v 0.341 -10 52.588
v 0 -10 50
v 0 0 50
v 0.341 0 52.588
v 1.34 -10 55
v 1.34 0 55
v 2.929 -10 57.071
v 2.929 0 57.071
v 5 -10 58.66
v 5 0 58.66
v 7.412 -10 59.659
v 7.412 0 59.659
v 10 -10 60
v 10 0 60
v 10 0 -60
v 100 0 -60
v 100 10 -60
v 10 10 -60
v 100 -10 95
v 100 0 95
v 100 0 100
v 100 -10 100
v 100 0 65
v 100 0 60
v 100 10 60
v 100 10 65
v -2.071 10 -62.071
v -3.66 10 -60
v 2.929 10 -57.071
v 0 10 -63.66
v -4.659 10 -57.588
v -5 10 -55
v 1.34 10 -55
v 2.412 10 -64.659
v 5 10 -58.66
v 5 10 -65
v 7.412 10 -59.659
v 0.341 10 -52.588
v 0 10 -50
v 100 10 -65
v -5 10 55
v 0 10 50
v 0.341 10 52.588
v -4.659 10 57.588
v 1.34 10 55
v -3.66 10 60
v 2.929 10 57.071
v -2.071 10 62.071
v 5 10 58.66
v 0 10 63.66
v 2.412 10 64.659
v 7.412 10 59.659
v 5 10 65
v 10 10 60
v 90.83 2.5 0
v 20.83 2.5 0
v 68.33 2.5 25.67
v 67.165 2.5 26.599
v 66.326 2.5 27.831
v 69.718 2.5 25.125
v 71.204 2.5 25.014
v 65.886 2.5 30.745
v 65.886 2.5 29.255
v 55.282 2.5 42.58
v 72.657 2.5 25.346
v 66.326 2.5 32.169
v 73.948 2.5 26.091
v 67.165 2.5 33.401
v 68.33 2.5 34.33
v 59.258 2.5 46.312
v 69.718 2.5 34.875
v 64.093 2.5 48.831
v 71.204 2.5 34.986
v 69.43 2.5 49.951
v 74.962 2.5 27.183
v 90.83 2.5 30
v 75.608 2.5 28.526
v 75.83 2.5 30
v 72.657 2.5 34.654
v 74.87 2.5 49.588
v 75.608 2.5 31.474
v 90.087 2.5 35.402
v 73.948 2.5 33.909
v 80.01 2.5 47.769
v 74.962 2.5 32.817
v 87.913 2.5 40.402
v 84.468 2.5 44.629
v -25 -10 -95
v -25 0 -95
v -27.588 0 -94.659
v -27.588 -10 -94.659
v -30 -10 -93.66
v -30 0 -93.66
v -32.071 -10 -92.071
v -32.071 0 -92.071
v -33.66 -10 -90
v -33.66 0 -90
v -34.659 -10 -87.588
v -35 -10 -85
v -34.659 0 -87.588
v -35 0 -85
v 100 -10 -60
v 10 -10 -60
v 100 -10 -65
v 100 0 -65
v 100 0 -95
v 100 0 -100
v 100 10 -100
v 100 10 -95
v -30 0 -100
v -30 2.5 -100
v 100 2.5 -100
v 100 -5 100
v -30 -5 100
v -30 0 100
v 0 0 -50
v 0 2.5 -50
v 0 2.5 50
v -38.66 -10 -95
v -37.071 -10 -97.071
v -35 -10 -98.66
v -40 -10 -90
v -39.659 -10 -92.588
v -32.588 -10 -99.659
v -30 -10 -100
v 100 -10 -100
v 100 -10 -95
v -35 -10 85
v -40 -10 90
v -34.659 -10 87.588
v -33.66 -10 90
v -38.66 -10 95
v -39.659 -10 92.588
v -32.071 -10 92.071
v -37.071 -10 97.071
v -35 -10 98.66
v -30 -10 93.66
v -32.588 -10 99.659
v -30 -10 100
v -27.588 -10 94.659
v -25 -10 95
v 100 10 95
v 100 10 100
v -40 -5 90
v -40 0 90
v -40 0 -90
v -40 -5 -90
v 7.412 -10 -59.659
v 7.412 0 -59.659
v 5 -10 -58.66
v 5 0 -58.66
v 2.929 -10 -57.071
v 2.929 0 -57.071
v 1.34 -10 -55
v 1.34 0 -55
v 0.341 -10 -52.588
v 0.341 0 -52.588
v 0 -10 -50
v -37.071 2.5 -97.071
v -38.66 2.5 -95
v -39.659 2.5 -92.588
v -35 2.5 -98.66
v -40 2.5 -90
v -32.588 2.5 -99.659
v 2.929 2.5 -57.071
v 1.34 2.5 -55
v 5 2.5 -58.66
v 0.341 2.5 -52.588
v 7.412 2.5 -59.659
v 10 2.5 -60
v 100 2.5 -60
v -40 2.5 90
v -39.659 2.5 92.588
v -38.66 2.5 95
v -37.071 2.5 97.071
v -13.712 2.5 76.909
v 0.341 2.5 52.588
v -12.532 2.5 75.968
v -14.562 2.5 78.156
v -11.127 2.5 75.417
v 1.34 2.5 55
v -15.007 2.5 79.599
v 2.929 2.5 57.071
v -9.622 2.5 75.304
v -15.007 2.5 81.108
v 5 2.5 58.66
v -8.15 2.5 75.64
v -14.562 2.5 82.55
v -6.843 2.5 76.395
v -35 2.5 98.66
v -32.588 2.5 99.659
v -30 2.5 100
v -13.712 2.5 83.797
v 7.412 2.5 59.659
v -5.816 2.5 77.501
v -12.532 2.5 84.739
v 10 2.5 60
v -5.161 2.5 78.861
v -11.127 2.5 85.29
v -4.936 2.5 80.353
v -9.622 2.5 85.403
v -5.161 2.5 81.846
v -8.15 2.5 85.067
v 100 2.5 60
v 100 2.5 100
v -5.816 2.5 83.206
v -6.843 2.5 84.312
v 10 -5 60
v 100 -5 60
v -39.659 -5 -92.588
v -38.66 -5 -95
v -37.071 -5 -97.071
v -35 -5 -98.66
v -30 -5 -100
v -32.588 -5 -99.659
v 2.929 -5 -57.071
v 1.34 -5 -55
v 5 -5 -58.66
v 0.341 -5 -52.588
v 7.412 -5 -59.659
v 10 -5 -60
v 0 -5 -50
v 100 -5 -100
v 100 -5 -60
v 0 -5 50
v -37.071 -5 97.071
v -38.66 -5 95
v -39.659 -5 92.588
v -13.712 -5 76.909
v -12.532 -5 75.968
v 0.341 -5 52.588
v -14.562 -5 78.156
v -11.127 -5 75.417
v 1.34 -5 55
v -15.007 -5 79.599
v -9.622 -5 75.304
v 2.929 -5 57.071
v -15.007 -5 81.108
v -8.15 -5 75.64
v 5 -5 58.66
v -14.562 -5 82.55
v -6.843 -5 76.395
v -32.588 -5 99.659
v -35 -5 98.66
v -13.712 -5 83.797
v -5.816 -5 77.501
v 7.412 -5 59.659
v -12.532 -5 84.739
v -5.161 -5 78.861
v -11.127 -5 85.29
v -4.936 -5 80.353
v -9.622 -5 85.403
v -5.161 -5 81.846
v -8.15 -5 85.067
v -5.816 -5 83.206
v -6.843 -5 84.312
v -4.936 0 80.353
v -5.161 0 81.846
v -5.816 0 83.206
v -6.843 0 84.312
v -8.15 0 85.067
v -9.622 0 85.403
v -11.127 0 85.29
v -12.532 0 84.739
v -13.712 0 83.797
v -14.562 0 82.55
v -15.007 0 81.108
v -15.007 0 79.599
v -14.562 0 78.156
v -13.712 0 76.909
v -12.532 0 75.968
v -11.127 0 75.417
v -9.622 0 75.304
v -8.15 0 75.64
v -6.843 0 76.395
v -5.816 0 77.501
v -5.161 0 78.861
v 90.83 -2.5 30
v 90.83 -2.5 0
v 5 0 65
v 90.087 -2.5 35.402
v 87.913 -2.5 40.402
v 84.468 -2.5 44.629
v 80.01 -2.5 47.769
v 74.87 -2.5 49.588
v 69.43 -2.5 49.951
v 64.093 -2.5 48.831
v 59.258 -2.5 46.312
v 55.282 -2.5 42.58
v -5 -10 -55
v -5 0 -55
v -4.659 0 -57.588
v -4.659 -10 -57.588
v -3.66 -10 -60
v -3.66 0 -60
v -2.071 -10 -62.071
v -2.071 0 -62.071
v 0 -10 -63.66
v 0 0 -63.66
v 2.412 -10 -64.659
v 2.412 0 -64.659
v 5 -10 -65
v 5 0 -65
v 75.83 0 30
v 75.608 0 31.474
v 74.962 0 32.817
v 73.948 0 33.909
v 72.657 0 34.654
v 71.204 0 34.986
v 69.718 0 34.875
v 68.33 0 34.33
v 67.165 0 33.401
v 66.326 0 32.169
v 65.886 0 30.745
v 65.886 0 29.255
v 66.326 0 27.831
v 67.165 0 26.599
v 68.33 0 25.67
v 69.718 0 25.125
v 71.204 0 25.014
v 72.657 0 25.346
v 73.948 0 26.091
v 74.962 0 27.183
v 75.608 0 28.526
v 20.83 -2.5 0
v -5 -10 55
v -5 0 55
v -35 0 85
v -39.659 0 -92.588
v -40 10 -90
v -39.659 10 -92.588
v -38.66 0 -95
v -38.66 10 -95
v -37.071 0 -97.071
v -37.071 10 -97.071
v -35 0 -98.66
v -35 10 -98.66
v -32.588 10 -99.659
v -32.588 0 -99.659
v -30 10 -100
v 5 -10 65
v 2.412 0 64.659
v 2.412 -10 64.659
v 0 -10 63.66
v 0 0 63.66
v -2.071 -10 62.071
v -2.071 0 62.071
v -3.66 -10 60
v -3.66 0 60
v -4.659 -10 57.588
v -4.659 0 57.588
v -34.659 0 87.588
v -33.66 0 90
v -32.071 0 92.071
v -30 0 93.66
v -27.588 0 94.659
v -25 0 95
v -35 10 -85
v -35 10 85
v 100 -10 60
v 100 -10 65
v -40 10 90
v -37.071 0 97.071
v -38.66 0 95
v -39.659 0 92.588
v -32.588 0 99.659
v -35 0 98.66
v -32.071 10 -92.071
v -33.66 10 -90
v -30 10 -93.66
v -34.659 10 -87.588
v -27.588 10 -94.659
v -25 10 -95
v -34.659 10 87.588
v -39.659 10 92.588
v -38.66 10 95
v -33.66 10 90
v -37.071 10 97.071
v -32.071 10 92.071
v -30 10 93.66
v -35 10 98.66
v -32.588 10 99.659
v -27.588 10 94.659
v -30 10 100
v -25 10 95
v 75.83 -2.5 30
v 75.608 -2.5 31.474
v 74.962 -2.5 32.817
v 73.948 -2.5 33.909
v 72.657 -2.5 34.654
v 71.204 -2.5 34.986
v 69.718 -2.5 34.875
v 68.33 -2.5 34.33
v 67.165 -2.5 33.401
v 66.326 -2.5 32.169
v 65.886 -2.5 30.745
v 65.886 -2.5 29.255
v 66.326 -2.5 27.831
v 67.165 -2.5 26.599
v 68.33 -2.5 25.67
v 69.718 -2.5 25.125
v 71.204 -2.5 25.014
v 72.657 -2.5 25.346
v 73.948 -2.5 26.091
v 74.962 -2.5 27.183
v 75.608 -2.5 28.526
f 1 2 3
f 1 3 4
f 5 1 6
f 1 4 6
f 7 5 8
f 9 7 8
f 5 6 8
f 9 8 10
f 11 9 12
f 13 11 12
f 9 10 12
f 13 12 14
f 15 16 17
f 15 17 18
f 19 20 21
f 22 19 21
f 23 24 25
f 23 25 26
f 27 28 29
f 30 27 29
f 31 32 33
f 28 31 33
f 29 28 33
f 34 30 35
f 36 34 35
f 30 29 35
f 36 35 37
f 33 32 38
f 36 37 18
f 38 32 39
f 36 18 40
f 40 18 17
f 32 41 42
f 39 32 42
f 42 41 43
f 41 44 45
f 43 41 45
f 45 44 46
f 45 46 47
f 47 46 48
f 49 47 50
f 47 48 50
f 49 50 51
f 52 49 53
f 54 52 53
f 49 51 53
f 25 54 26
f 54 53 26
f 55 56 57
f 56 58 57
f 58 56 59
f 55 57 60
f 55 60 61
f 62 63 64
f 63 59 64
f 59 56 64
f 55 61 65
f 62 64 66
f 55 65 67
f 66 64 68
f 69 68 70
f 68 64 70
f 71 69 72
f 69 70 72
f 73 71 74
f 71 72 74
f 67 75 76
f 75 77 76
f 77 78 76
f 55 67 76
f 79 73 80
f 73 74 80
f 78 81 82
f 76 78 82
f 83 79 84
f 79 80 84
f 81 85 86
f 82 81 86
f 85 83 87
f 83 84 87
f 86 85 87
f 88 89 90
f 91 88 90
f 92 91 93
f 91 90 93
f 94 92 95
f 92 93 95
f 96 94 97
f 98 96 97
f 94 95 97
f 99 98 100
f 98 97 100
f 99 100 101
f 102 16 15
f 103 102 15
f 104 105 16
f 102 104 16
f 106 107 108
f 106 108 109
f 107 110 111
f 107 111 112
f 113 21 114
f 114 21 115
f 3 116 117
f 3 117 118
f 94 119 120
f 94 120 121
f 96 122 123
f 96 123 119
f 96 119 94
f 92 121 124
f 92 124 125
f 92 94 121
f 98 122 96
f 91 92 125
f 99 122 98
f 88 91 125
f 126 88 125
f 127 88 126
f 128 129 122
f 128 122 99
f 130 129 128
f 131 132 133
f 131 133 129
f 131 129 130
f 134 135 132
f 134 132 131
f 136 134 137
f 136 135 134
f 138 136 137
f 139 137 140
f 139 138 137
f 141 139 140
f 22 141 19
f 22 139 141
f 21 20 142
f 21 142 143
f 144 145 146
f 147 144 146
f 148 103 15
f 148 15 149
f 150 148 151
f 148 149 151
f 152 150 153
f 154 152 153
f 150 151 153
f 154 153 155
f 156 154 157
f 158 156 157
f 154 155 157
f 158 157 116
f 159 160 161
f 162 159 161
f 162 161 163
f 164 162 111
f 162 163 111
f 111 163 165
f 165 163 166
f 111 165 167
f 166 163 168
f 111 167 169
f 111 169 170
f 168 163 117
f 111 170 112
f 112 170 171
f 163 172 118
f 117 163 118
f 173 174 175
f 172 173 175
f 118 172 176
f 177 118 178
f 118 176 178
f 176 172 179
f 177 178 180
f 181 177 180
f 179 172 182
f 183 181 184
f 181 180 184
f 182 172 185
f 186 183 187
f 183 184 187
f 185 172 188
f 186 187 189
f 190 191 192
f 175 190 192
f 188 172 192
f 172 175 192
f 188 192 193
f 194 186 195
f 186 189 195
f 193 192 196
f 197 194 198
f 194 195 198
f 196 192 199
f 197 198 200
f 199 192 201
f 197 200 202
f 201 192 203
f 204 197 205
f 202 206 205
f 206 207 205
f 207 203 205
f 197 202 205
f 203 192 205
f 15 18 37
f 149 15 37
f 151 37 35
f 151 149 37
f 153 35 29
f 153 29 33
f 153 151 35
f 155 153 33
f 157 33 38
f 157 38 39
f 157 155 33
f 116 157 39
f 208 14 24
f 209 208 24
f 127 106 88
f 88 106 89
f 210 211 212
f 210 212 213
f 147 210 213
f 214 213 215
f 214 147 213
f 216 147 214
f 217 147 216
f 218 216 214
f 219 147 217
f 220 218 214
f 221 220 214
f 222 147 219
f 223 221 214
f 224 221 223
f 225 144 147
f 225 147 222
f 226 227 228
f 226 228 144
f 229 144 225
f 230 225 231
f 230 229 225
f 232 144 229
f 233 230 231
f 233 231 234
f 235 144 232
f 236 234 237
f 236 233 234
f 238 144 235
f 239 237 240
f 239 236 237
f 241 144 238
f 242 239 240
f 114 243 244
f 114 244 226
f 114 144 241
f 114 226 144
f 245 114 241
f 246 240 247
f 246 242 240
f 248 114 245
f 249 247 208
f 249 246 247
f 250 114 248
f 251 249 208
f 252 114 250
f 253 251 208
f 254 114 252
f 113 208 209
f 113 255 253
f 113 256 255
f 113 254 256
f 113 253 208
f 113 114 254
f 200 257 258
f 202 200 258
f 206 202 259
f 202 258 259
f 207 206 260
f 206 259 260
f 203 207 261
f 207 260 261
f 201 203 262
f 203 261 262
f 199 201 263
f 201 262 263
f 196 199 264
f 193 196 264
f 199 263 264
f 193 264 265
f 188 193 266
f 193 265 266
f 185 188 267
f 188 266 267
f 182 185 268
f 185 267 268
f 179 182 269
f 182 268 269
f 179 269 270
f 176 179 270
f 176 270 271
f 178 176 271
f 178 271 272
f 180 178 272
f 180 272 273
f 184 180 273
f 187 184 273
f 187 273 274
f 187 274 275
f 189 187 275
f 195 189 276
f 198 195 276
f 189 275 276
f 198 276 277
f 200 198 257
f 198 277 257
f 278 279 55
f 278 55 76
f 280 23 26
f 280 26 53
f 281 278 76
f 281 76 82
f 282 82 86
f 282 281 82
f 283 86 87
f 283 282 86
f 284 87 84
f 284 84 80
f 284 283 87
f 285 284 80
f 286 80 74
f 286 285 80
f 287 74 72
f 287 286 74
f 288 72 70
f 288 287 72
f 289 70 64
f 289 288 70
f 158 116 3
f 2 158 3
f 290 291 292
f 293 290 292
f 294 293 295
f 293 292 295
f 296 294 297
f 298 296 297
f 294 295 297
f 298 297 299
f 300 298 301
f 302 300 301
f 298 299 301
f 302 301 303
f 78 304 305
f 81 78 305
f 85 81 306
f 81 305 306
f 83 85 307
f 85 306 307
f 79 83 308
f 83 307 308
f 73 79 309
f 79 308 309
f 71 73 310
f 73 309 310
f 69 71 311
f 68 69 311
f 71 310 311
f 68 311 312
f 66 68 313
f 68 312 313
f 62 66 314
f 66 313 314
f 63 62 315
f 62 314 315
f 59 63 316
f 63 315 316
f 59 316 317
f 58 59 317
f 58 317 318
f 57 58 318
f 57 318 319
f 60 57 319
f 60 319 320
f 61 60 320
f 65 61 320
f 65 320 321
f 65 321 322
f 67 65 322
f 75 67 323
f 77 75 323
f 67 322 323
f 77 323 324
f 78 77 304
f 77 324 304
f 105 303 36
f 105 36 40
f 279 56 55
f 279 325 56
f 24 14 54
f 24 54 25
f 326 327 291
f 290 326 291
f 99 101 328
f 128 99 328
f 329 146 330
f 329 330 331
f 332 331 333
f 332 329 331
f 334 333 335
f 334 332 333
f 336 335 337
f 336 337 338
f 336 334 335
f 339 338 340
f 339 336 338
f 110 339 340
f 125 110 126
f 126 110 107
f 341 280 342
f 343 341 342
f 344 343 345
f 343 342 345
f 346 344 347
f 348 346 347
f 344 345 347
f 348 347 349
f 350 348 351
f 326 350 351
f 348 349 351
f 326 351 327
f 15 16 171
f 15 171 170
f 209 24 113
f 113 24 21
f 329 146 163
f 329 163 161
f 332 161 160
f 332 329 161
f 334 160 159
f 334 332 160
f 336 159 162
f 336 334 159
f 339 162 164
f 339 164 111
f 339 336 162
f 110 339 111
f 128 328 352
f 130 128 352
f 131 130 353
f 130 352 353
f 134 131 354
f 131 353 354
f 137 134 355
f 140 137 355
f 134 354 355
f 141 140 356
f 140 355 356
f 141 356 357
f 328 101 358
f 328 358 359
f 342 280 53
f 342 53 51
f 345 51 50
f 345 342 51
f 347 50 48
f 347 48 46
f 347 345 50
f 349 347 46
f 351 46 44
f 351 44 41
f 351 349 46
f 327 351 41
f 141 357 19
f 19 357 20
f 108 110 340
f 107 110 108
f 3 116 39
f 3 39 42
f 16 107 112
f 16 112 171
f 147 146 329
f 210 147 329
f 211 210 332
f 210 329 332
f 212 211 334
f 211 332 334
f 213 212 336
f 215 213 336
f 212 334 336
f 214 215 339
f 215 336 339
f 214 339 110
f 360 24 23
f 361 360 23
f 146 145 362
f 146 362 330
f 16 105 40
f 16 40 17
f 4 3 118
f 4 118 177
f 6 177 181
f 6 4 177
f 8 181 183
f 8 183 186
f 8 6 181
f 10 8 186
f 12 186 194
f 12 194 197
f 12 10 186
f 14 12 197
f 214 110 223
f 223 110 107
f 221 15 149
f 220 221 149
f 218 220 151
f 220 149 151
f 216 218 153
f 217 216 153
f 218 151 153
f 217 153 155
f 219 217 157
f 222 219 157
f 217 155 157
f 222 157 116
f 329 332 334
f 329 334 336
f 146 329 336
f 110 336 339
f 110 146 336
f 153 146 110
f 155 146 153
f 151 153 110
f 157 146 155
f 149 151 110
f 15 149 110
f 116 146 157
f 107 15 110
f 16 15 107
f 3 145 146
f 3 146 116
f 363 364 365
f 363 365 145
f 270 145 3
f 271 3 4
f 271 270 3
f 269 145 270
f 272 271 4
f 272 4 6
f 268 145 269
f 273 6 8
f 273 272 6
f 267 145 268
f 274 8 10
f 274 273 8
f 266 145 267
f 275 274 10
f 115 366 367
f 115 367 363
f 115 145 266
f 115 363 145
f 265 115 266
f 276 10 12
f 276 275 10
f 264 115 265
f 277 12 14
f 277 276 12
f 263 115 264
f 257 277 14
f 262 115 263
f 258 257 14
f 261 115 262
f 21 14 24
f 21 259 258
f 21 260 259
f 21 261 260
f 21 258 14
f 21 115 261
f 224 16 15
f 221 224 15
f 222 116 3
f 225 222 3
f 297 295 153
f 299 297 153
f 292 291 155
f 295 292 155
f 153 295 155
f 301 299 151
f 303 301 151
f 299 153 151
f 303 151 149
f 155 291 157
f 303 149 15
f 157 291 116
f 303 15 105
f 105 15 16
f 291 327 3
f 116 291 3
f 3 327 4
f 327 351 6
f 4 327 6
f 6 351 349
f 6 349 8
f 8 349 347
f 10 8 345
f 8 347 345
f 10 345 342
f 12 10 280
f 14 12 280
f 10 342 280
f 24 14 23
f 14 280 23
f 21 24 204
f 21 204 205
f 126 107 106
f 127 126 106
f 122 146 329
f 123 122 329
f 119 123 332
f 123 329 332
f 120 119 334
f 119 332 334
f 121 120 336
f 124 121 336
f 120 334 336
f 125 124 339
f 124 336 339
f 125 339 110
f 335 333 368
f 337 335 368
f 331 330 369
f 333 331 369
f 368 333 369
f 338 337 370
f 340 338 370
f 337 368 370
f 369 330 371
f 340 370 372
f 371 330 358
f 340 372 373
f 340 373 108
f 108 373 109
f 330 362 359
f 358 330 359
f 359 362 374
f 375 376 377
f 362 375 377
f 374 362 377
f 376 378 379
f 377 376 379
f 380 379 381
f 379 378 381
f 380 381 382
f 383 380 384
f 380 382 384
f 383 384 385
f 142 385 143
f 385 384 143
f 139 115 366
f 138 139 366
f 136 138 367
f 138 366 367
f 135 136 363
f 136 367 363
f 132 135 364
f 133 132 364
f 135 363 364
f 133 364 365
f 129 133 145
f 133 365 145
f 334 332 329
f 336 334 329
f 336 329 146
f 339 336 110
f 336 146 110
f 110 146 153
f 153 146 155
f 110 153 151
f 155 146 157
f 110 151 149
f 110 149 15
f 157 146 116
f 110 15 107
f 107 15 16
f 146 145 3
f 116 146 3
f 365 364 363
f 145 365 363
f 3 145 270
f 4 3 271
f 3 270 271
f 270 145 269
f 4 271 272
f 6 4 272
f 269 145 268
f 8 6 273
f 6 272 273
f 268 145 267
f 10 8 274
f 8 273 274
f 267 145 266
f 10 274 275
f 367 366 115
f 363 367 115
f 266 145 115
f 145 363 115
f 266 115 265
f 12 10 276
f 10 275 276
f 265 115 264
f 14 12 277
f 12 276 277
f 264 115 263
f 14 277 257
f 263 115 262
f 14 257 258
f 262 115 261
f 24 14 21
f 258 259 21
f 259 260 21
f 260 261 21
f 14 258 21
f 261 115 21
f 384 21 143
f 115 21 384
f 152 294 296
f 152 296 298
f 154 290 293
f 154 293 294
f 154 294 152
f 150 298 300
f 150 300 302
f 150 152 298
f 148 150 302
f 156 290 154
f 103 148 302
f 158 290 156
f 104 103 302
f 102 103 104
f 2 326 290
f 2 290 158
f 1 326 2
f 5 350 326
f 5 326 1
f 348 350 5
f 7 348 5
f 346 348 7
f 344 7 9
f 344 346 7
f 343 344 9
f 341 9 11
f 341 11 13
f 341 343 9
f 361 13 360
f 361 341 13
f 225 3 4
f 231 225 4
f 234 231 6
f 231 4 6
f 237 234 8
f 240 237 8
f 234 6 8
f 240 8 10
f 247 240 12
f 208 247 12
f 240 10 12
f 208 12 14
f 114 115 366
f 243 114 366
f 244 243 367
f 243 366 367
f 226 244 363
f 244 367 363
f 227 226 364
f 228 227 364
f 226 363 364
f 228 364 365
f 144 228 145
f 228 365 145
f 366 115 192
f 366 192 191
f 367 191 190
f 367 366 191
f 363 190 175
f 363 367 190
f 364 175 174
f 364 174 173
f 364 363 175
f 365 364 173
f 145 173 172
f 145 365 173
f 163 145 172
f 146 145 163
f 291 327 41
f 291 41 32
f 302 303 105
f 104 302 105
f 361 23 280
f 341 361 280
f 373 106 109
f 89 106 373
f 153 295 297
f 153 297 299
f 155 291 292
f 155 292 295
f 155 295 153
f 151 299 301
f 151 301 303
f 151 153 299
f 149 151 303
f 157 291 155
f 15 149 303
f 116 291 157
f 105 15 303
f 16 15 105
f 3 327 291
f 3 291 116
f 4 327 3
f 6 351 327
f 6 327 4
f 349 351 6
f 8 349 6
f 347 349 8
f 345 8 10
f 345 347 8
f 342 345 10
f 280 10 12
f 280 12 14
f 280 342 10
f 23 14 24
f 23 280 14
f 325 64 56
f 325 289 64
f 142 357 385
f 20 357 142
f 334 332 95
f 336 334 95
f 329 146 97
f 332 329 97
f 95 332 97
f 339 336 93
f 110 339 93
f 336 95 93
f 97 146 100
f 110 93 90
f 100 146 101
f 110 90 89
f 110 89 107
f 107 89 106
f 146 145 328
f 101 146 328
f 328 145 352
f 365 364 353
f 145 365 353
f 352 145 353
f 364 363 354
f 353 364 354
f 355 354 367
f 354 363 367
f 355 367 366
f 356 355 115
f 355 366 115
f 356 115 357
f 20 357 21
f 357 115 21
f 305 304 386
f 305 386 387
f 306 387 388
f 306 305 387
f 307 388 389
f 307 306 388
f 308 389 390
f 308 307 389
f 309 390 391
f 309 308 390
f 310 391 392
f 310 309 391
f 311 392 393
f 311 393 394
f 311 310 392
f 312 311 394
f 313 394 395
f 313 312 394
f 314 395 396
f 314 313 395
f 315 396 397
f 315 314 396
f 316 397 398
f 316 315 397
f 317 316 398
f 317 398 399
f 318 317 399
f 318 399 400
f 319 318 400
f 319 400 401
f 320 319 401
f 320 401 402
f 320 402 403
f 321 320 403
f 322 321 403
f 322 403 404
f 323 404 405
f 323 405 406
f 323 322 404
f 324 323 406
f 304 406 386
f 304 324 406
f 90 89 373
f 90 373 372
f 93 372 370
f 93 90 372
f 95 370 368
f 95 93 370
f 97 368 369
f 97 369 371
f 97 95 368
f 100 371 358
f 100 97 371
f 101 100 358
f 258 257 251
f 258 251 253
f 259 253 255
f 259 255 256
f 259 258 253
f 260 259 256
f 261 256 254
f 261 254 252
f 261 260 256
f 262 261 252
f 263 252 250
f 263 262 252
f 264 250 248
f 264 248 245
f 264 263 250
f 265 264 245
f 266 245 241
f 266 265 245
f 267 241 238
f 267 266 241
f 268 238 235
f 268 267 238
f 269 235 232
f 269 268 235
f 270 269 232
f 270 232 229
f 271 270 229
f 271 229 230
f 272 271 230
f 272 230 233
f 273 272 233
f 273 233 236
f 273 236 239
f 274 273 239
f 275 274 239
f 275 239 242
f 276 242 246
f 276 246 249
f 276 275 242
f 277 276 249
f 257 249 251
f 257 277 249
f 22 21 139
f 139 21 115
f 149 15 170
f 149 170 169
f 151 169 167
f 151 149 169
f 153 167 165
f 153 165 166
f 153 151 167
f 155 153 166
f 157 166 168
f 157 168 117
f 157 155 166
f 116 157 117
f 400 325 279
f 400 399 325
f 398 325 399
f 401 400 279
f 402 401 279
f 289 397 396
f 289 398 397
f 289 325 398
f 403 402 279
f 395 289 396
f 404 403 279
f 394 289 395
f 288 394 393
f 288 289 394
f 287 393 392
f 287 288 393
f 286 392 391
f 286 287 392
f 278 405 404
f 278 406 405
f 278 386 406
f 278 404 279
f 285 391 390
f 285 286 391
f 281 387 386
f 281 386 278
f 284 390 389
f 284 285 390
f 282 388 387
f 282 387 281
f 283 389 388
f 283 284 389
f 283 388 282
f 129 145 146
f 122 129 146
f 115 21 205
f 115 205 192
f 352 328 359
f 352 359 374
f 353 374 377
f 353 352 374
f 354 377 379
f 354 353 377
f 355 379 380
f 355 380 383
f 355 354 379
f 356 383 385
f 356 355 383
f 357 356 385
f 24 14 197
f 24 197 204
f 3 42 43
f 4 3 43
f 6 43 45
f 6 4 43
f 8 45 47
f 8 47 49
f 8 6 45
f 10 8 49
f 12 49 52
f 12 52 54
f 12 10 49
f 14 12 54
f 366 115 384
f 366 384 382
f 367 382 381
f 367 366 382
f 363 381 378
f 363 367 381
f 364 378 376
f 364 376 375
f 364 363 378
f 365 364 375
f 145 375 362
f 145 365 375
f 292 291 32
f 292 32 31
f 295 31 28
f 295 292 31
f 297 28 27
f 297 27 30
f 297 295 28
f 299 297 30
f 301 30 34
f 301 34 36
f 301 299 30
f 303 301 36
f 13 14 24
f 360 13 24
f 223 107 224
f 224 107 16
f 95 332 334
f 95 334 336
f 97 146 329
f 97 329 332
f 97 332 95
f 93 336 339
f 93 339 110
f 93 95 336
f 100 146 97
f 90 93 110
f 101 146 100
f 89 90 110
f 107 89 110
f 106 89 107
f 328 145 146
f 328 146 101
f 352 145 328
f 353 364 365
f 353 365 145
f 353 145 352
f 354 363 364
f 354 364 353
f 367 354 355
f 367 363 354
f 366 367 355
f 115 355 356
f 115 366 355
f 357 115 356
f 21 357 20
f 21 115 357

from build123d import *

# Parameters (mm, degrees)
F1_DEPTH = 10
F2_DEPTH = 10
F0_R     = 5.0635209728
F3_DEPTH = 5
F4_DEPTH = 2.5
F5_R     = 5
F6_DEPTH = 2.5
F7_DEPTH = 2.5


with BuildPart() as f1:
    # F0 (on Front) → F1 (new body)
    with BuildSketch(Plane.XZ):
        with BuildLine():
            Line((-25, 95), (100, 95))
            Line((100, 95), (100, 100))
            Line((100, 100), (-30, 100))
            ThreePointArc((-30, 100), (-37.0710678119, 97.0710678119), (-40, 90))
            Line((-40, 90), (-40, 0))
            Line((-40, 0), (-40, -90))
            ThreePointArc((-40, -90), (-37.0710678119, -97.0710678119), (-30, -100))
            Line((-30, -100), (100, -100))
            Line((100, -100), (100, -95))
            Line((100, -95), (-25, -95))
            ThreePointArc((-25, -95), (-32.0710678119, -92.0710678119), (-35, -85))
            Line((-35, -85), (-35, 85))
            ThreePointArc((-35, 85), (-32.0710678119, 92.0710678119), (-25, 95))
        make_face()
    extrude(amount=F1_DEPTH)


with BuildPart() as f1b:
    # F0 (on Front) → F1, piece 2 (new body)
    with BuildSketch(Plane.XZ):
        with BuildLine():
            Line((0, -50), (0, 0))
            Line((0, 0), (0, 50))
            ThreePointArc((0, 50), (2.9289321881, 57.0710678119), (10, 60))
            Line((10, 60), (100, 60))
            Line((100, 60), (100, 65))
            Line((100, 65), (5, 65))
            ThreePointArc((5, 65), (-2.0710678119, 62.0710678119), (-5, 55))
            Line((-5, 55), (-5, -55))
            ThreePointArc((-5, -55), (-2.0710678119, -62.0710678119), (5, -65))
            Line((5, -65), (100, -65))
            Line((100, -65), (100, -60))
            Line((100, -60), (10, -60))
            ThreePointArc((10, -60), (2.9289321881, -57.0710678119), (0, -50))
        make_face()
    extrude(amount=F1_DEPTH)


with BuildPart() as f2:
    # F2 (new): a face of the model
    f2_faces = [f1.part.faces().sort_by_distance(p)[0] for p in [
        (-37.4413111231, 0, 0),
    ]]
    extrude(f2_faces, amount=F2_DEPTH)


with BuildPart() as f2b:
    # F2#2 (new): a face of the model
    f2_2_faces = [f1b.part.faces().sort_by_distance(p)[0] for p in [
        (-1.6710774967, 0, 0),
    ]]
    extrude(f2_2_faces, amount=F2_DEPTH)


with BuildPart() as f3:
    # F0 (on Front) → F3 (new body)
    with BuildSketch(Plane.XZ):
        with BuildLine():
            Line((0, -50), (0, 0))
            Line((0, 0), (0, 50))
            ThreePointArc((0, 50), (2.9289321881, 57.0710678119), (10, 60))
            Line((10, 60), (100, 60))
            Line((100, 60), (100, 65))
            Line((100, 65), (5, 65))
            ThreePointArc((5, 65), (-2.0710678119, 62.0710678119), (-5, 55))
            Line((-5, 55), (-5, -55))
            ThreePointArc((-5, -55), (-2.0710678119, -62.0710678119), (5, -65))
            Line((5, -65), (100, -65))
            Line((100, -65), (100, -60))
            Line((100, -60), (10, -60))
            ThreePointArc((10, -60), (2.9289321881, -57.0710678119), (0, -50))
        make_face()
        with BuildLine():
            Line((5, 65), (100, 65))
            Line((100, 65), (100, 95))
            Line((100, 95), (-25, 95))
            ThreePointArc((-25, 95), (-32.0710678119, 92.0710678119), (-35, 85))
            Line((-35, 85), (-35, -85))
            ThreePointArc((-35, -85), (-32.0710678119, -92.0710678119), (-25, -95))
            Line((-25, -95), (100, -95))
            Line((100, -95), (100, -65))
            Line((100, -65), (5, -65))
            ThreePointArc((5, -65), (-2.0710678119, -62.0710678119), (-5, -55))
            Line((-5, -55), (-5, 55))
            ThreePointArc((-5, 55), (-2.0710678119, 62.0710678119), (5, 65))
        make_face()
        with Locations((-10, 80.3533643484)):
            Circle(F0_R, mode=Mode.SUBTRACT)
        with BuildLine():
            Line((-25, 95), (100, 95))
            Line((100, 95), (100, 100))
            Line((100, 100), (-30, 100))
            ThreePointArc((-30, 100), (-37.0710678119, 97.0710678119), (-40, 90))
            Line((-40, 90), (-40, 0))
            Line((-40, 0), (-40, -90))
            ThreePointArc((-40, -90), (-37.0710678119, -97.0710678119), (-30, -100))
            Line((-30, -100), (100, -100))
            Line((100, -100), (100, -95))
            Line((100, -95), (-25, -95))
            ThreePointArc((-25, -95), (-32.0710678119, -92.0710678119), (-35, -85))
            Line((-35, -85), (-35, 85))
            ThreePointArc((-35, 85), (-32.0710678119, 92.0710678119), (-25, 95))
        make_face()
    extrude(amount=F3_DEPTH)


with BuildPart() as f4:
    # F4 (new): a face of the model
    f4_faces = [f3.part.faces().sort_by_distance(p)[0] for p in [
        (-2.4413111231, 0, 0),
    ]]
    extrude(f4_faces, amount=F4_DEPTH)


with BuildPart() as f6:
    # F5 (on Front) → F6 (new body)
    with BuildSketch(Plane.XZ):
        with BuildLine():
            Line((20.8303779364, 0), (90.8303779364, 0))
            Line((90.8303779364, 0), (90.8303779364, 30))
            ThreePointArc((90.8303779364, 30), (77.5026750427, 48.8541892248), (55.2823328039, 42.5800752207))
            Line((55.2823328039, 42.5800752207), (20.8303779364, 0))
        make_face()
        with Locations((70.8303779364, 30)):
            Circle(F5_R, mode=Mode.SUBTRACT)
    extrude(amount=F6_DEPTH)

    # F7 (add): a face of the model
    f7_faces = [f6.faces().sort_by_distance(p)[0] for p in [
        (63.5665137167, 0, 20.2914976507),
    ]]
    extrude(f7_faces, amount=F7_DEPTH)


solid = Compound([f1.part, f1b.part, f2.part, f2b.part, f3.part, f4.part, f6.part])
